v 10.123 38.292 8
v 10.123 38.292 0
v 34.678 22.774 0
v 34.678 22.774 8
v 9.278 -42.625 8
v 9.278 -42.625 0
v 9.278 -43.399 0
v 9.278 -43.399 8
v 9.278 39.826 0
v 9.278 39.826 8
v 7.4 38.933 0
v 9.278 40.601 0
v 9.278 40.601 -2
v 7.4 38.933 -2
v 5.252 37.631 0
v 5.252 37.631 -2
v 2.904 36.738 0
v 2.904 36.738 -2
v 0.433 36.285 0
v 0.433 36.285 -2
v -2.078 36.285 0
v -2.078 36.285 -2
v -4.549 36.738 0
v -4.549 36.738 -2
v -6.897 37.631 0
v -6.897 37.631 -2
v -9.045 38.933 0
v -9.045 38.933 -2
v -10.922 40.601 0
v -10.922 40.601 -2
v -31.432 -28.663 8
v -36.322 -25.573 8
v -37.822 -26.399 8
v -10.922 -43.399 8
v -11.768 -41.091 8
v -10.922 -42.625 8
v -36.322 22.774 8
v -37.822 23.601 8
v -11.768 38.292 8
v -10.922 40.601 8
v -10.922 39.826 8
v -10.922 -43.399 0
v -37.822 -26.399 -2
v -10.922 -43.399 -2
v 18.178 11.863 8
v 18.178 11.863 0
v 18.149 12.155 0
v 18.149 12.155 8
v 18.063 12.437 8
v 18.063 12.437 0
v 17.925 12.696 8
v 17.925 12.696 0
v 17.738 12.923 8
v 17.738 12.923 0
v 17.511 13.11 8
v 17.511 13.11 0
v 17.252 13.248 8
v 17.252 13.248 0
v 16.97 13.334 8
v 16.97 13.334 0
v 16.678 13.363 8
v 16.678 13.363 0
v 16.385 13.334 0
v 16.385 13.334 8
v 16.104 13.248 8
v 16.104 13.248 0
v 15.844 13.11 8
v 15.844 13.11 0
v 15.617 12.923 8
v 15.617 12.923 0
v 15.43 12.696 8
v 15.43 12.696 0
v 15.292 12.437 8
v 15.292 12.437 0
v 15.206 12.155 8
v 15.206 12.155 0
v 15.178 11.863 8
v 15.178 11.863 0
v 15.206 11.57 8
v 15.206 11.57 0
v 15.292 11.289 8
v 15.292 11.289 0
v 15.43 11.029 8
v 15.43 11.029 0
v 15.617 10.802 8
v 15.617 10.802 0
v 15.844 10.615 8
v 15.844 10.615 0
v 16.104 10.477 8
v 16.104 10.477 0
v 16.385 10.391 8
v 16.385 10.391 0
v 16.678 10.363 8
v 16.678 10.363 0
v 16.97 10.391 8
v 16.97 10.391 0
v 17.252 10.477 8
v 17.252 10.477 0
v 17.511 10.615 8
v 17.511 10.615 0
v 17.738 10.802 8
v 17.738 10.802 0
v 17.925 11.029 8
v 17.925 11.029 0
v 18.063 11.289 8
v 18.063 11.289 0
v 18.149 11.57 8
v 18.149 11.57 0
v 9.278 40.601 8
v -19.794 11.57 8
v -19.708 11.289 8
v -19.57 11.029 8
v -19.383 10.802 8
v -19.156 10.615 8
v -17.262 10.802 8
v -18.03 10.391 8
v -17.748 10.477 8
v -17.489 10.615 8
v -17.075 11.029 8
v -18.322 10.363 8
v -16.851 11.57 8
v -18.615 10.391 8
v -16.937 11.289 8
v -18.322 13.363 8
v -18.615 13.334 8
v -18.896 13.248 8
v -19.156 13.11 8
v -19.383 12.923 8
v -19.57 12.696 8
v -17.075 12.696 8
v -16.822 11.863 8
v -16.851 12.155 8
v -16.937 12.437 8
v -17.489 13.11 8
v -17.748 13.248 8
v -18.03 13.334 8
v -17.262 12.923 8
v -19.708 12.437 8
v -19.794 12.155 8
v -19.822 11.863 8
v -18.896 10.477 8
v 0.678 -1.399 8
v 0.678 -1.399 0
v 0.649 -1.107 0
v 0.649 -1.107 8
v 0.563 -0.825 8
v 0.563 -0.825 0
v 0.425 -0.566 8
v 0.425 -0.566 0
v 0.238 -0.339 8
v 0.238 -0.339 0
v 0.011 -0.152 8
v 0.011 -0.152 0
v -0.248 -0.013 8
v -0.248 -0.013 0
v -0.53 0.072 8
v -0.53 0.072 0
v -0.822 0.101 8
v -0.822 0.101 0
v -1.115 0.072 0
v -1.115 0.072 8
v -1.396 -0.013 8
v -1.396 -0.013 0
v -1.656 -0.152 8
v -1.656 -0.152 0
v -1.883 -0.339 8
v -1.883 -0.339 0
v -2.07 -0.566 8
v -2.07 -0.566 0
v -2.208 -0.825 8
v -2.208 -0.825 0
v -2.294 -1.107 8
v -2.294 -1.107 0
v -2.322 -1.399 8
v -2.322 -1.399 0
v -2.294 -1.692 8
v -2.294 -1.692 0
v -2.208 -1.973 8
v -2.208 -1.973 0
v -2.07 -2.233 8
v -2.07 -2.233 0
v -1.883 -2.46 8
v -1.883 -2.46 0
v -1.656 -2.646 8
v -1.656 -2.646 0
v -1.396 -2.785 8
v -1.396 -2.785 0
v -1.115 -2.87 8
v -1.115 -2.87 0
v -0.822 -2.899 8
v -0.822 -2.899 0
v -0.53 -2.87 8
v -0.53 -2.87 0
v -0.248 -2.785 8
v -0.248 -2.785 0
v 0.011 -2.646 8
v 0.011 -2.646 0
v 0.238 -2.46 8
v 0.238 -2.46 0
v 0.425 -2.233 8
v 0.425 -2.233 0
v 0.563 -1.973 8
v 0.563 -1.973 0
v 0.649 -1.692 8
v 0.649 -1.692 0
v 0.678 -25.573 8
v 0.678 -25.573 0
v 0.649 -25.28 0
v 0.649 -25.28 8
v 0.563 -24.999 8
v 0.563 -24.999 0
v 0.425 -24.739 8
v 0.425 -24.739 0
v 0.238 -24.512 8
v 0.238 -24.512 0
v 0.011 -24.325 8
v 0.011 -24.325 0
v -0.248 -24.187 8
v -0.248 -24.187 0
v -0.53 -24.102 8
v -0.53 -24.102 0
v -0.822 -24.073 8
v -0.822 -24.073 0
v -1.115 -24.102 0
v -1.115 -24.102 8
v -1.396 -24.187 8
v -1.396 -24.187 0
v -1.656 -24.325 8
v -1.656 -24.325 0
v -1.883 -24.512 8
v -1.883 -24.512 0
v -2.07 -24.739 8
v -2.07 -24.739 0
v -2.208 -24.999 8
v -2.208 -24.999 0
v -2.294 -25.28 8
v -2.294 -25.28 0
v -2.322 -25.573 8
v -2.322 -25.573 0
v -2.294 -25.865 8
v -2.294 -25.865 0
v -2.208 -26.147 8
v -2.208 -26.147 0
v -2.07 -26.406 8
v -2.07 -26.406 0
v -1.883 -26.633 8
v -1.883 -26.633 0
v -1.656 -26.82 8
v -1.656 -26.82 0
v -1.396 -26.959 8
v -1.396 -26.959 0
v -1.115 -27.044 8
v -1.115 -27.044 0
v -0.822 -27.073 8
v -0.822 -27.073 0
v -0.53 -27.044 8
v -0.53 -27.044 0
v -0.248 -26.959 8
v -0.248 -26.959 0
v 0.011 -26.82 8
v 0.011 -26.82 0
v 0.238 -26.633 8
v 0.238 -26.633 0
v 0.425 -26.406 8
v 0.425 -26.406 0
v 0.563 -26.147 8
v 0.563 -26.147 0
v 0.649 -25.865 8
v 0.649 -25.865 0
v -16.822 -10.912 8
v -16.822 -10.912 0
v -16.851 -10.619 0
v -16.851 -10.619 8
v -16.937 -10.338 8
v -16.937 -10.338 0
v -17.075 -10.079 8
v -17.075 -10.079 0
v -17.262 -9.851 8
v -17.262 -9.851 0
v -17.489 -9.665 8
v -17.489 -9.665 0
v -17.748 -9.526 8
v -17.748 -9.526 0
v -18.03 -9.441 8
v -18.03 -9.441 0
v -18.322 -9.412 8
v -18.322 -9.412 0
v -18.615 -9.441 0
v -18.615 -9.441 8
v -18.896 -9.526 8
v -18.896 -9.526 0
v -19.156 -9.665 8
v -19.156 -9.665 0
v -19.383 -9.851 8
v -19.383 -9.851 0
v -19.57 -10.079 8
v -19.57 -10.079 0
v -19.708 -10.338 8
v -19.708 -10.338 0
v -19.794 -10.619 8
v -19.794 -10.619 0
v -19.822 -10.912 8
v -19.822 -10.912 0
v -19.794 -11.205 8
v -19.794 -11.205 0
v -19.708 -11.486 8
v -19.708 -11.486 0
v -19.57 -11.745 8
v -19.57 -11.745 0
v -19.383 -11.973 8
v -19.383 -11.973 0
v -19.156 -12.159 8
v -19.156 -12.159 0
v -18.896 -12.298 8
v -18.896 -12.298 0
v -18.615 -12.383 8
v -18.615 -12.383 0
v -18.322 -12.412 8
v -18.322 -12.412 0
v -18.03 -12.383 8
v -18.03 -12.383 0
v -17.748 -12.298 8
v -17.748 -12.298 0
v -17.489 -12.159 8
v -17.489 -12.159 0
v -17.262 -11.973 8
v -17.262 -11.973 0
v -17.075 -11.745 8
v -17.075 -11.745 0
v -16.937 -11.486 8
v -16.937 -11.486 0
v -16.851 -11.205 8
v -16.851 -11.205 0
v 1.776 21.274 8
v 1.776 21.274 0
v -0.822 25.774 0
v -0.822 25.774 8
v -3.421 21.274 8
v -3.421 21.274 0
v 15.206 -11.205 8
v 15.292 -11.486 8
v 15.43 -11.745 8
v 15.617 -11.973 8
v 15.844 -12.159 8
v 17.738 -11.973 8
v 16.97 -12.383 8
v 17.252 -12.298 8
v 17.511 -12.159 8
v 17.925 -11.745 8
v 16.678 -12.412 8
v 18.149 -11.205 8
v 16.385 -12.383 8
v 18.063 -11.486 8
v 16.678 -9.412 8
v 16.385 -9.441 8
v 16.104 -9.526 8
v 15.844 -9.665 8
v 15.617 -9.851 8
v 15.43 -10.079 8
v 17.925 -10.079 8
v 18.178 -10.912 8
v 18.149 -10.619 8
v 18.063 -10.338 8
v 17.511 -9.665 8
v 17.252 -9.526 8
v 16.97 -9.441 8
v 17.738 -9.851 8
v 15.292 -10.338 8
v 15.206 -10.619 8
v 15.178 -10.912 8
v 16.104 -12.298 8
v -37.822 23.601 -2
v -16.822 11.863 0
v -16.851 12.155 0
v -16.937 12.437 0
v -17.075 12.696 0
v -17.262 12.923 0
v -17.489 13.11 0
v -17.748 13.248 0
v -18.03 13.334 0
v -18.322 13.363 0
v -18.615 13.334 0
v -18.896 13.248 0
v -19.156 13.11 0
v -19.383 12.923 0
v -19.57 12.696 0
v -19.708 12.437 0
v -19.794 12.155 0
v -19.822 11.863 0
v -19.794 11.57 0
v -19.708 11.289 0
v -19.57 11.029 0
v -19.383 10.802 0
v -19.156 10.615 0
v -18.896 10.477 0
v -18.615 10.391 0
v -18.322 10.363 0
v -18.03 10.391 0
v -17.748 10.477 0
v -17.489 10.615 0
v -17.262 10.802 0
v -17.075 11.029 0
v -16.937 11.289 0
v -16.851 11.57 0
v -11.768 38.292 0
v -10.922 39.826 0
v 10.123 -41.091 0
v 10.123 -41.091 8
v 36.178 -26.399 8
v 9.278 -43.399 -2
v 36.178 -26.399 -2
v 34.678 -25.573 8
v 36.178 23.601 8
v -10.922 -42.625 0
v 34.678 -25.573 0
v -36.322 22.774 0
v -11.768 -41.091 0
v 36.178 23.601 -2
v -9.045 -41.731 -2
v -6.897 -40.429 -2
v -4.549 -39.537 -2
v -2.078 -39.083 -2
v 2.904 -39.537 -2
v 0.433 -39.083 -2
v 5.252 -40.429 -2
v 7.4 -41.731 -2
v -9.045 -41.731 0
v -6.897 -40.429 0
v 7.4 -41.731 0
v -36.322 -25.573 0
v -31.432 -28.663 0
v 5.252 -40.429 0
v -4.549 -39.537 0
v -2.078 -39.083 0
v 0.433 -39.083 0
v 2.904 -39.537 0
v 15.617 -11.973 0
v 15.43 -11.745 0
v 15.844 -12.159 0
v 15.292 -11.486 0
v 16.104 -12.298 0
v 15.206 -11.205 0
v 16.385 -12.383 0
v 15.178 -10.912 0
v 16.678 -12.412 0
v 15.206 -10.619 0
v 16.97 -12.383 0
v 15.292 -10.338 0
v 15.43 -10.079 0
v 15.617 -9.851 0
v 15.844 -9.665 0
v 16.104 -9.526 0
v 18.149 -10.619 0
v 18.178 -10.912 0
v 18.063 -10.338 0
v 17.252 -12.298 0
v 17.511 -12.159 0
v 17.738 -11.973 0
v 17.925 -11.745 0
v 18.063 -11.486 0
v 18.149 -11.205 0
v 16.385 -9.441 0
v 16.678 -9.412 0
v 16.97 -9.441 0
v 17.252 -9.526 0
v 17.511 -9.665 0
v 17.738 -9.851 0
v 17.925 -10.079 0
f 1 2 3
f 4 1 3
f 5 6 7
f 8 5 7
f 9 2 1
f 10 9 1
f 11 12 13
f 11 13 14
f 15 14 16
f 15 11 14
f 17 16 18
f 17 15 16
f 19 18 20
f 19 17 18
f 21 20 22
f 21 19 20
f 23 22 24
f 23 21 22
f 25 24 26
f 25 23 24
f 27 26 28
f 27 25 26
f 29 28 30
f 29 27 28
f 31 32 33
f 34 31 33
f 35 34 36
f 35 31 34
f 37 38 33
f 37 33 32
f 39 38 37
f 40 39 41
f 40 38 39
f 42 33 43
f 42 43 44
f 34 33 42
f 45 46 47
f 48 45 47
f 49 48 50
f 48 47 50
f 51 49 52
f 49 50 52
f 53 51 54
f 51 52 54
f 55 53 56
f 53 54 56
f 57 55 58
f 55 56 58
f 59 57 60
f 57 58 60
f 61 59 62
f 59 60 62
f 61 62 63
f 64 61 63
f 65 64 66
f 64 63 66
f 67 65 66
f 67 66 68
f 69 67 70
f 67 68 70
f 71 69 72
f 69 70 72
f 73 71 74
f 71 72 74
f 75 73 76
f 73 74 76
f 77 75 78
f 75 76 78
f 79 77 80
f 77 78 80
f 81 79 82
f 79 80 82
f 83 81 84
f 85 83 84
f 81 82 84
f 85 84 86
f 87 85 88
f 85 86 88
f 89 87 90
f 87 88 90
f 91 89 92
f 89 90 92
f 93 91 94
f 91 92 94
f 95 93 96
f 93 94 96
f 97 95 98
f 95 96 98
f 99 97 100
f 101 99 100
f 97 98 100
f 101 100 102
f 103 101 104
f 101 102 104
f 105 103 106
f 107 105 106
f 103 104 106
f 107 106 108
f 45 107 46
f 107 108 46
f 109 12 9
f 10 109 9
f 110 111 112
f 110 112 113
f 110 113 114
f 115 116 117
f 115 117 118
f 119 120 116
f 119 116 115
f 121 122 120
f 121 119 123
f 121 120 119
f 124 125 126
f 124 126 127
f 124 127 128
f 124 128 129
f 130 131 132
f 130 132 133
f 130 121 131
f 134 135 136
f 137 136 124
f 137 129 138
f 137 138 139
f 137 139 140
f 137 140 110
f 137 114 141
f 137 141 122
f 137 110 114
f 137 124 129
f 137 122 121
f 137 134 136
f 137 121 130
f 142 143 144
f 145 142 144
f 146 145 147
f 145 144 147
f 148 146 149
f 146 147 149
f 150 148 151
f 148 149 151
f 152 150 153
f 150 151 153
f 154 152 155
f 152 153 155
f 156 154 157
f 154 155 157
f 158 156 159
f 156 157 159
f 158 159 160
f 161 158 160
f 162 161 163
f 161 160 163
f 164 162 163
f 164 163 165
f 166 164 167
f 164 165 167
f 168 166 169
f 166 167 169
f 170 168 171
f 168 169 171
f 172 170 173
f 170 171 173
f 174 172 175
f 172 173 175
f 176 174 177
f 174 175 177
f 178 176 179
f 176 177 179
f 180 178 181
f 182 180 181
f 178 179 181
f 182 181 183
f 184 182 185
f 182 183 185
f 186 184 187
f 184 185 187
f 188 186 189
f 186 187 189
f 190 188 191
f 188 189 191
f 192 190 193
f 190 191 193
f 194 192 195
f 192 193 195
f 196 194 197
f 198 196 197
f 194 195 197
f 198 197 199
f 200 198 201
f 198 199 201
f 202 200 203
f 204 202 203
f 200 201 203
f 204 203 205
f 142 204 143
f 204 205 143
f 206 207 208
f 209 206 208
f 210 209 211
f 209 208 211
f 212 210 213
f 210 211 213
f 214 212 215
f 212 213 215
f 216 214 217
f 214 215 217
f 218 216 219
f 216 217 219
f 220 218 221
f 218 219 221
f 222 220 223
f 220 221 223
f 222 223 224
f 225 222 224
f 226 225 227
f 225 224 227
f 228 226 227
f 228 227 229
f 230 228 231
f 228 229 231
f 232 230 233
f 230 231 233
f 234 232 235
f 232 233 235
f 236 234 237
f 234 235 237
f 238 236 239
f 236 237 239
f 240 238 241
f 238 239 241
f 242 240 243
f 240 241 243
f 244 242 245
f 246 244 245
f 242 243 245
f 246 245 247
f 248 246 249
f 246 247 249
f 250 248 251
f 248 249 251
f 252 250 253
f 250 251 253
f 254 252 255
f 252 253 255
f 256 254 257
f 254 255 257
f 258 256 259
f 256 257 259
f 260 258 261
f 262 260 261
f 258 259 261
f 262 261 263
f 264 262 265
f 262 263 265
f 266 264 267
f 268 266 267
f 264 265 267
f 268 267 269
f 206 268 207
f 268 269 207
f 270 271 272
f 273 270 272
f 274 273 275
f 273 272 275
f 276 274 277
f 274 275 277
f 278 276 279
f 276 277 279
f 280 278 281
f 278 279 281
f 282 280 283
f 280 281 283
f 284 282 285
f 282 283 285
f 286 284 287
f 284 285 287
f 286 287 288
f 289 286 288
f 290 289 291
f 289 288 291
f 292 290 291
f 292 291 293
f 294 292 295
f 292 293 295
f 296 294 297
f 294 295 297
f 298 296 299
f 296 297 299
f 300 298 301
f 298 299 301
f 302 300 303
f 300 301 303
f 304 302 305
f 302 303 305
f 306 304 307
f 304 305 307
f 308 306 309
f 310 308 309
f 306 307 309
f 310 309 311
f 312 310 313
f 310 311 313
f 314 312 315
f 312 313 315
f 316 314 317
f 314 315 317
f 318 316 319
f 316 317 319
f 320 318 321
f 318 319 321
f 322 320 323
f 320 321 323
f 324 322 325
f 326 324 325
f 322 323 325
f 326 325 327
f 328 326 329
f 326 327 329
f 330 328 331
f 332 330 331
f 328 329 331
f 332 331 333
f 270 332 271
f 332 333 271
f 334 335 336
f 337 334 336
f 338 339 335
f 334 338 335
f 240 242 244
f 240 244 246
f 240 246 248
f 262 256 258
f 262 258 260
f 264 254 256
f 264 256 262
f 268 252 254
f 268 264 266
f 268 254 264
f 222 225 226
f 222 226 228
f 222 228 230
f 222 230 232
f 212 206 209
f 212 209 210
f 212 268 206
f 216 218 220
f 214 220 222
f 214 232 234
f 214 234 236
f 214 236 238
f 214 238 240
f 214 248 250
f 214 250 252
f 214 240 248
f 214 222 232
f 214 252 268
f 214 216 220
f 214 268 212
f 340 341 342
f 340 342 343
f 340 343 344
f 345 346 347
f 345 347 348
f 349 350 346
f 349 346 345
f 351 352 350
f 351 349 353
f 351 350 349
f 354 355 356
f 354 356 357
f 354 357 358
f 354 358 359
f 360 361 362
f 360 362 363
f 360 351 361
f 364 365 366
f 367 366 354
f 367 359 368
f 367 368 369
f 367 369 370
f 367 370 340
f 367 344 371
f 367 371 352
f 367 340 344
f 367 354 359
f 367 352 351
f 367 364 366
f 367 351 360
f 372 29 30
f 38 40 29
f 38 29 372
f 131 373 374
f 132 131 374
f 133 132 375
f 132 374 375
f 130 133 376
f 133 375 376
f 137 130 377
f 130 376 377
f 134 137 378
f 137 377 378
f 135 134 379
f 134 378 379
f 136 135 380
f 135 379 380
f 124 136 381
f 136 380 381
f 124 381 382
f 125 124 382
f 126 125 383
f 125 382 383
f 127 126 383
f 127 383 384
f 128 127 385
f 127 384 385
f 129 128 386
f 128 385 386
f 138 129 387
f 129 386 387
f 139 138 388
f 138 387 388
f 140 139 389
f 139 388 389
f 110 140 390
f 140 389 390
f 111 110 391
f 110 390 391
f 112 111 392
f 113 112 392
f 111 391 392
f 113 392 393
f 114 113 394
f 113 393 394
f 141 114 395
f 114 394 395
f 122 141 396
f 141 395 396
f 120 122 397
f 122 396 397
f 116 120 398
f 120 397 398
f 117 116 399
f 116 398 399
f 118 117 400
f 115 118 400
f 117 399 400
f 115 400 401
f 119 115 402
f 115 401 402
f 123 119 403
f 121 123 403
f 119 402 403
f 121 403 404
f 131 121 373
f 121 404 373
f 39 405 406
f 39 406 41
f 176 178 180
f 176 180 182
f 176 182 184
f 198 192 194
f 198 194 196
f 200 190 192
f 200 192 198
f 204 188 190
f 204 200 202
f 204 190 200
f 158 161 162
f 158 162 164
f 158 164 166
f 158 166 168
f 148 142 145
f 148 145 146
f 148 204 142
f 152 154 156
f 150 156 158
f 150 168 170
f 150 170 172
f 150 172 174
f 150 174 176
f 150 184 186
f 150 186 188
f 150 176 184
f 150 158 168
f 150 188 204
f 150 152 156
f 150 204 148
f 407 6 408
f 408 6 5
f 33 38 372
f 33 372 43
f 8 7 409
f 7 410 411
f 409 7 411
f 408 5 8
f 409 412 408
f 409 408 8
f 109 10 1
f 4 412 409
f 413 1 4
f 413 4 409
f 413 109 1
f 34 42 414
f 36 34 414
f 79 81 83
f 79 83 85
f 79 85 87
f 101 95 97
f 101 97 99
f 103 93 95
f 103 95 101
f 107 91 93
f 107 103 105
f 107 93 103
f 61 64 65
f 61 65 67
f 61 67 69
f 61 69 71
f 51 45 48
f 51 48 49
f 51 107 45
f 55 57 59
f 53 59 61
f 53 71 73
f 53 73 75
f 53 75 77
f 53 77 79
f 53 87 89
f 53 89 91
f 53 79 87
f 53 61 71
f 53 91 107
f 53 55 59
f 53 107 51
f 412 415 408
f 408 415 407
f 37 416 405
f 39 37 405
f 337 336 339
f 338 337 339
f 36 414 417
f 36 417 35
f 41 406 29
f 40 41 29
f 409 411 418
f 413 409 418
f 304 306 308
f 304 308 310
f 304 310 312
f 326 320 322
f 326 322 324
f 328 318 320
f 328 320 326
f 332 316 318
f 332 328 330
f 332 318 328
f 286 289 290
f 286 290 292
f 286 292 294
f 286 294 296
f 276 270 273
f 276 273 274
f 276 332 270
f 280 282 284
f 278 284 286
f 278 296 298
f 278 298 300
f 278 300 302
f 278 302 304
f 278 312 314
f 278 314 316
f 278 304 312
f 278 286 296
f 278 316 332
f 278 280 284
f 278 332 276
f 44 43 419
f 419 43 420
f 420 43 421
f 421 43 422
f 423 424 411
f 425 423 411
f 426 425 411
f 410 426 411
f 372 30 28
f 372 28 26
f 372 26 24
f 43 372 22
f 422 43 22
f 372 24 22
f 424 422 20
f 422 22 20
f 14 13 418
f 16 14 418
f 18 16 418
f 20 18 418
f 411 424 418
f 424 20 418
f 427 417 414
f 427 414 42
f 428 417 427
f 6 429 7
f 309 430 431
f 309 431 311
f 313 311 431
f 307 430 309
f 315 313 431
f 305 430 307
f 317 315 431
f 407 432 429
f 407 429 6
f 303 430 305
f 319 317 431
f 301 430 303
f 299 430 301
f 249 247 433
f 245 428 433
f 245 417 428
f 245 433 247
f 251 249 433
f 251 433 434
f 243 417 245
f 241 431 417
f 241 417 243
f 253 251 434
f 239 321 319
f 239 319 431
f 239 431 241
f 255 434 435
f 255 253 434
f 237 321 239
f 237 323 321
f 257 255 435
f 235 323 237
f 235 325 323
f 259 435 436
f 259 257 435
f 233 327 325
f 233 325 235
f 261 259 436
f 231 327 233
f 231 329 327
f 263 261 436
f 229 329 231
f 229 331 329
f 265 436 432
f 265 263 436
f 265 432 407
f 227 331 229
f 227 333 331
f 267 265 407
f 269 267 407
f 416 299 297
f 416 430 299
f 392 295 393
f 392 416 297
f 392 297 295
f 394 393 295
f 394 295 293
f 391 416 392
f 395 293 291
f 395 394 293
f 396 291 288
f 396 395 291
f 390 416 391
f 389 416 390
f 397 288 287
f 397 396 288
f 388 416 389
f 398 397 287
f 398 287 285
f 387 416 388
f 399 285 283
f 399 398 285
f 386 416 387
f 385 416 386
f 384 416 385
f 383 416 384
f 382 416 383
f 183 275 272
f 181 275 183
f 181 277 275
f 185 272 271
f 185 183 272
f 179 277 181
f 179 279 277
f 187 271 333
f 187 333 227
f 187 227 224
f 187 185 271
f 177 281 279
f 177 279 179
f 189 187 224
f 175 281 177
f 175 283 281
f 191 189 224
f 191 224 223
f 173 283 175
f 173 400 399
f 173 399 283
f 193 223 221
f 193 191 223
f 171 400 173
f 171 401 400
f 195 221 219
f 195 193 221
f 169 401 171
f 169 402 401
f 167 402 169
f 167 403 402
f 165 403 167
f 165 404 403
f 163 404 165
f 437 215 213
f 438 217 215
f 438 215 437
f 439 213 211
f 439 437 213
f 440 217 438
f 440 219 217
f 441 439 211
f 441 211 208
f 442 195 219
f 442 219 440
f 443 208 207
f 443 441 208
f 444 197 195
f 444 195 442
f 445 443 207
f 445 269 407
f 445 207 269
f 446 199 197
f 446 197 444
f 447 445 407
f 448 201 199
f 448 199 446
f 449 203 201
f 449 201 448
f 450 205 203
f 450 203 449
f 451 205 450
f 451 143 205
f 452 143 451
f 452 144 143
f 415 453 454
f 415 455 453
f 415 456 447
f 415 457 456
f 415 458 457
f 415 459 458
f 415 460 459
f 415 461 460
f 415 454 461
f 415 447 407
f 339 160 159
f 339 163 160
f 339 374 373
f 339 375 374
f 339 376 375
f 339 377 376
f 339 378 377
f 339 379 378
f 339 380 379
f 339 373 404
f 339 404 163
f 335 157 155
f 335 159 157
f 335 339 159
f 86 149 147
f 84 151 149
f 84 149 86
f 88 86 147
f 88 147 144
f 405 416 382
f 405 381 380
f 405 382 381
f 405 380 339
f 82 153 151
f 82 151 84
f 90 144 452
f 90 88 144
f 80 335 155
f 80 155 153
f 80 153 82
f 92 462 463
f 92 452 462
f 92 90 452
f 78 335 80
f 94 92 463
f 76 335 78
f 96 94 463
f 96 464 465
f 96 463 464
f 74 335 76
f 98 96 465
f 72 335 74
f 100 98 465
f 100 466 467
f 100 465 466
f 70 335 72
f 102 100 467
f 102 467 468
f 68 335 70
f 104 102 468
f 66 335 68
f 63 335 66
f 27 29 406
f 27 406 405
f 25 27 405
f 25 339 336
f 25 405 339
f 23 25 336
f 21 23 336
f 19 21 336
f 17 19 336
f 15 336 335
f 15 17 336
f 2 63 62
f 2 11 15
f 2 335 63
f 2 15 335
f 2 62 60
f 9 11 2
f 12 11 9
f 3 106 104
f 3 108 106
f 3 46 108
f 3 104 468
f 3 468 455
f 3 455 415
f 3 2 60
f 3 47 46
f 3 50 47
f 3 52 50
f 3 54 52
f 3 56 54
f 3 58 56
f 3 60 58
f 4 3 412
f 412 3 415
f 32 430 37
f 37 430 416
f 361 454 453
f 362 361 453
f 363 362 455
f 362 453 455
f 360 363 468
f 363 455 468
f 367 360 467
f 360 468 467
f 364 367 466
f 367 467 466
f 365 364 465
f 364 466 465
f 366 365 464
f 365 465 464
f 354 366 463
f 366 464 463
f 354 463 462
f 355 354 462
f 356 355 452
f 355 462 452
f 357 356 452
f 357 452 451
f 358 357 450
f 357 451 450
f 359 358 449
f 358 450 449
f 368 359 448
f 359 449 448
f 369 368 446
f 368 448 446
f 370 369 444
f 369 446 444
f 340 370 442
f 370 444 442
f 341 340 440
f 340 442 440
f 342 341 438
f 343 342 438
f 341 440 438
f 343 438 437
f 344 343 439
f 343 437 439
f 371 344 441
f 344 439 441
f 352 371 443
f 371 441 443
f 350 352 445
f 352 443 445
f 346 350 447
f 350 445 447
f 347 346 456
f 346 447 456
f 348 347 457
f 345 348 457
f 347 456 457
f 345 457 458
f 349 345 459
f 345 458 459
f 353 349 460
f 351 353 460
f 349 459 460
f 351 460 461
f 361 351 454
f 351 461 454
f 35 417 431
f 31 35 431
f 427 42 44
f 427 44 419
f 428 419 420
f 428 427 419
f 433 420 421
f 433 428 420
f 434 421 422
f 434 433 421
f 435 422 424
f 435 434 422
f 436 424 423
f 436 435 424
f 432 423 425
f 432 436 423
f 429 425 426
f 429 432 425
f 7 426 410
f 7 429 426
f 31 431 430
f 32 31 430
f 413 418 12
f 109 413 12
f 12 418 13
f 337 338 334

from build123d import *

# Parameters (mm, degrees)
F1_DEPTH = 2
F3_DEPTH = 8
F4_R     = 1.5
F5_DEPTH = 8
F6_SIZE  = 1


with BuildPart() as f1:
    # F0 (on Top) → F1 (new body)
    with BuildSketch(Plane.XY):
        with BuildLine():
            Line((-10.922433, 40.600829), (-37.822433, 23.600829))
            Line((-37.822433, 23.600829), (-37.822433, -26.399171))
            Line((-37.822433, -26.399171), (-10.922433, -43.399171))
            ThreePointArc((-10.922433, -43.399171), (-0.822433, -39.026117), (9.277567, -43.399171))
            Line((9.277567, -43.399171), (36.177567, -26.399171))
            Line((36.177567, -26.399171), (36.177567, 23.600829))
            Line((36.177567, 23.600829), (9.277567, 40.600829))
            ThreePointArc((9.277567, 40.600829), (-0.822433, 36.227775), (-10.922433, 40.600829))
        make_face()
    extrude(amount=-F1_DEPTH)

    # F2 (on Top) → F3 (join)
    with BuildSketch(Plane.XY):
        Polygon((36.177567, -15.736748), (36.177567, 23.600829), (9.277567, 40.600829), (9.277567, 38.826394), (34.677567, 22.774349), (34.677567, -18.295043), (34.677567, -25.572692), (9.277567, -41.624736), (9.277567, -43.399171), (36.177567, -26.399171), align=None)
        Polygon((-10.922433, 38.826394), (-10.922433, 40.600829), (-37.822433, 23.600829), (-37.822433, -26.399171), (-10.922433, -43.399171), (-10.922433, -41.624736), (-31.431845, -28.663398), (-36.322433, -25.572692), (-36.322433, 22.774349), align=None)
    extrude(amount=F3_DEPTH)

    # F4 (on face) → F5 (join)
    with BuildSketch(Plane.XY):
        with Locations((-0.822433, -25.572692)):
            Circle(F4_R)
        with Locations((-0.822433, -1.399171)):
            Circle(F4_R)
        with Locations((16.677567, -10.911981)):
            Circle(F4_R)
        with Locations((16.677567, 11.862593)):
            Circle(F4_R)
        with Locations((-18.322433, 11.862593)):
            Circle(F4_R)
        with Locations((-18.322433, -10.911981)):
            Circle(F4_R)
        Polygon((-3.420509, 21.274349), (1.775643, 21.274349), (-0.822433, 25.774349), align=None)
    extrude(amount=F5_DEPTH)

    # F6
    f6_edges = [f1.edges().sort_by_distance(p)[0] for p in [
        (-10.922433, 38.826394, 4),
        (9.277567, 38.826394, 4),
        (-10.922433, -41.624736, 4),
        (9.277567, -41.624736, 4),
    ]]
    chamfer(f6_edges, length=F6_SIZE)


solid = f1.part
